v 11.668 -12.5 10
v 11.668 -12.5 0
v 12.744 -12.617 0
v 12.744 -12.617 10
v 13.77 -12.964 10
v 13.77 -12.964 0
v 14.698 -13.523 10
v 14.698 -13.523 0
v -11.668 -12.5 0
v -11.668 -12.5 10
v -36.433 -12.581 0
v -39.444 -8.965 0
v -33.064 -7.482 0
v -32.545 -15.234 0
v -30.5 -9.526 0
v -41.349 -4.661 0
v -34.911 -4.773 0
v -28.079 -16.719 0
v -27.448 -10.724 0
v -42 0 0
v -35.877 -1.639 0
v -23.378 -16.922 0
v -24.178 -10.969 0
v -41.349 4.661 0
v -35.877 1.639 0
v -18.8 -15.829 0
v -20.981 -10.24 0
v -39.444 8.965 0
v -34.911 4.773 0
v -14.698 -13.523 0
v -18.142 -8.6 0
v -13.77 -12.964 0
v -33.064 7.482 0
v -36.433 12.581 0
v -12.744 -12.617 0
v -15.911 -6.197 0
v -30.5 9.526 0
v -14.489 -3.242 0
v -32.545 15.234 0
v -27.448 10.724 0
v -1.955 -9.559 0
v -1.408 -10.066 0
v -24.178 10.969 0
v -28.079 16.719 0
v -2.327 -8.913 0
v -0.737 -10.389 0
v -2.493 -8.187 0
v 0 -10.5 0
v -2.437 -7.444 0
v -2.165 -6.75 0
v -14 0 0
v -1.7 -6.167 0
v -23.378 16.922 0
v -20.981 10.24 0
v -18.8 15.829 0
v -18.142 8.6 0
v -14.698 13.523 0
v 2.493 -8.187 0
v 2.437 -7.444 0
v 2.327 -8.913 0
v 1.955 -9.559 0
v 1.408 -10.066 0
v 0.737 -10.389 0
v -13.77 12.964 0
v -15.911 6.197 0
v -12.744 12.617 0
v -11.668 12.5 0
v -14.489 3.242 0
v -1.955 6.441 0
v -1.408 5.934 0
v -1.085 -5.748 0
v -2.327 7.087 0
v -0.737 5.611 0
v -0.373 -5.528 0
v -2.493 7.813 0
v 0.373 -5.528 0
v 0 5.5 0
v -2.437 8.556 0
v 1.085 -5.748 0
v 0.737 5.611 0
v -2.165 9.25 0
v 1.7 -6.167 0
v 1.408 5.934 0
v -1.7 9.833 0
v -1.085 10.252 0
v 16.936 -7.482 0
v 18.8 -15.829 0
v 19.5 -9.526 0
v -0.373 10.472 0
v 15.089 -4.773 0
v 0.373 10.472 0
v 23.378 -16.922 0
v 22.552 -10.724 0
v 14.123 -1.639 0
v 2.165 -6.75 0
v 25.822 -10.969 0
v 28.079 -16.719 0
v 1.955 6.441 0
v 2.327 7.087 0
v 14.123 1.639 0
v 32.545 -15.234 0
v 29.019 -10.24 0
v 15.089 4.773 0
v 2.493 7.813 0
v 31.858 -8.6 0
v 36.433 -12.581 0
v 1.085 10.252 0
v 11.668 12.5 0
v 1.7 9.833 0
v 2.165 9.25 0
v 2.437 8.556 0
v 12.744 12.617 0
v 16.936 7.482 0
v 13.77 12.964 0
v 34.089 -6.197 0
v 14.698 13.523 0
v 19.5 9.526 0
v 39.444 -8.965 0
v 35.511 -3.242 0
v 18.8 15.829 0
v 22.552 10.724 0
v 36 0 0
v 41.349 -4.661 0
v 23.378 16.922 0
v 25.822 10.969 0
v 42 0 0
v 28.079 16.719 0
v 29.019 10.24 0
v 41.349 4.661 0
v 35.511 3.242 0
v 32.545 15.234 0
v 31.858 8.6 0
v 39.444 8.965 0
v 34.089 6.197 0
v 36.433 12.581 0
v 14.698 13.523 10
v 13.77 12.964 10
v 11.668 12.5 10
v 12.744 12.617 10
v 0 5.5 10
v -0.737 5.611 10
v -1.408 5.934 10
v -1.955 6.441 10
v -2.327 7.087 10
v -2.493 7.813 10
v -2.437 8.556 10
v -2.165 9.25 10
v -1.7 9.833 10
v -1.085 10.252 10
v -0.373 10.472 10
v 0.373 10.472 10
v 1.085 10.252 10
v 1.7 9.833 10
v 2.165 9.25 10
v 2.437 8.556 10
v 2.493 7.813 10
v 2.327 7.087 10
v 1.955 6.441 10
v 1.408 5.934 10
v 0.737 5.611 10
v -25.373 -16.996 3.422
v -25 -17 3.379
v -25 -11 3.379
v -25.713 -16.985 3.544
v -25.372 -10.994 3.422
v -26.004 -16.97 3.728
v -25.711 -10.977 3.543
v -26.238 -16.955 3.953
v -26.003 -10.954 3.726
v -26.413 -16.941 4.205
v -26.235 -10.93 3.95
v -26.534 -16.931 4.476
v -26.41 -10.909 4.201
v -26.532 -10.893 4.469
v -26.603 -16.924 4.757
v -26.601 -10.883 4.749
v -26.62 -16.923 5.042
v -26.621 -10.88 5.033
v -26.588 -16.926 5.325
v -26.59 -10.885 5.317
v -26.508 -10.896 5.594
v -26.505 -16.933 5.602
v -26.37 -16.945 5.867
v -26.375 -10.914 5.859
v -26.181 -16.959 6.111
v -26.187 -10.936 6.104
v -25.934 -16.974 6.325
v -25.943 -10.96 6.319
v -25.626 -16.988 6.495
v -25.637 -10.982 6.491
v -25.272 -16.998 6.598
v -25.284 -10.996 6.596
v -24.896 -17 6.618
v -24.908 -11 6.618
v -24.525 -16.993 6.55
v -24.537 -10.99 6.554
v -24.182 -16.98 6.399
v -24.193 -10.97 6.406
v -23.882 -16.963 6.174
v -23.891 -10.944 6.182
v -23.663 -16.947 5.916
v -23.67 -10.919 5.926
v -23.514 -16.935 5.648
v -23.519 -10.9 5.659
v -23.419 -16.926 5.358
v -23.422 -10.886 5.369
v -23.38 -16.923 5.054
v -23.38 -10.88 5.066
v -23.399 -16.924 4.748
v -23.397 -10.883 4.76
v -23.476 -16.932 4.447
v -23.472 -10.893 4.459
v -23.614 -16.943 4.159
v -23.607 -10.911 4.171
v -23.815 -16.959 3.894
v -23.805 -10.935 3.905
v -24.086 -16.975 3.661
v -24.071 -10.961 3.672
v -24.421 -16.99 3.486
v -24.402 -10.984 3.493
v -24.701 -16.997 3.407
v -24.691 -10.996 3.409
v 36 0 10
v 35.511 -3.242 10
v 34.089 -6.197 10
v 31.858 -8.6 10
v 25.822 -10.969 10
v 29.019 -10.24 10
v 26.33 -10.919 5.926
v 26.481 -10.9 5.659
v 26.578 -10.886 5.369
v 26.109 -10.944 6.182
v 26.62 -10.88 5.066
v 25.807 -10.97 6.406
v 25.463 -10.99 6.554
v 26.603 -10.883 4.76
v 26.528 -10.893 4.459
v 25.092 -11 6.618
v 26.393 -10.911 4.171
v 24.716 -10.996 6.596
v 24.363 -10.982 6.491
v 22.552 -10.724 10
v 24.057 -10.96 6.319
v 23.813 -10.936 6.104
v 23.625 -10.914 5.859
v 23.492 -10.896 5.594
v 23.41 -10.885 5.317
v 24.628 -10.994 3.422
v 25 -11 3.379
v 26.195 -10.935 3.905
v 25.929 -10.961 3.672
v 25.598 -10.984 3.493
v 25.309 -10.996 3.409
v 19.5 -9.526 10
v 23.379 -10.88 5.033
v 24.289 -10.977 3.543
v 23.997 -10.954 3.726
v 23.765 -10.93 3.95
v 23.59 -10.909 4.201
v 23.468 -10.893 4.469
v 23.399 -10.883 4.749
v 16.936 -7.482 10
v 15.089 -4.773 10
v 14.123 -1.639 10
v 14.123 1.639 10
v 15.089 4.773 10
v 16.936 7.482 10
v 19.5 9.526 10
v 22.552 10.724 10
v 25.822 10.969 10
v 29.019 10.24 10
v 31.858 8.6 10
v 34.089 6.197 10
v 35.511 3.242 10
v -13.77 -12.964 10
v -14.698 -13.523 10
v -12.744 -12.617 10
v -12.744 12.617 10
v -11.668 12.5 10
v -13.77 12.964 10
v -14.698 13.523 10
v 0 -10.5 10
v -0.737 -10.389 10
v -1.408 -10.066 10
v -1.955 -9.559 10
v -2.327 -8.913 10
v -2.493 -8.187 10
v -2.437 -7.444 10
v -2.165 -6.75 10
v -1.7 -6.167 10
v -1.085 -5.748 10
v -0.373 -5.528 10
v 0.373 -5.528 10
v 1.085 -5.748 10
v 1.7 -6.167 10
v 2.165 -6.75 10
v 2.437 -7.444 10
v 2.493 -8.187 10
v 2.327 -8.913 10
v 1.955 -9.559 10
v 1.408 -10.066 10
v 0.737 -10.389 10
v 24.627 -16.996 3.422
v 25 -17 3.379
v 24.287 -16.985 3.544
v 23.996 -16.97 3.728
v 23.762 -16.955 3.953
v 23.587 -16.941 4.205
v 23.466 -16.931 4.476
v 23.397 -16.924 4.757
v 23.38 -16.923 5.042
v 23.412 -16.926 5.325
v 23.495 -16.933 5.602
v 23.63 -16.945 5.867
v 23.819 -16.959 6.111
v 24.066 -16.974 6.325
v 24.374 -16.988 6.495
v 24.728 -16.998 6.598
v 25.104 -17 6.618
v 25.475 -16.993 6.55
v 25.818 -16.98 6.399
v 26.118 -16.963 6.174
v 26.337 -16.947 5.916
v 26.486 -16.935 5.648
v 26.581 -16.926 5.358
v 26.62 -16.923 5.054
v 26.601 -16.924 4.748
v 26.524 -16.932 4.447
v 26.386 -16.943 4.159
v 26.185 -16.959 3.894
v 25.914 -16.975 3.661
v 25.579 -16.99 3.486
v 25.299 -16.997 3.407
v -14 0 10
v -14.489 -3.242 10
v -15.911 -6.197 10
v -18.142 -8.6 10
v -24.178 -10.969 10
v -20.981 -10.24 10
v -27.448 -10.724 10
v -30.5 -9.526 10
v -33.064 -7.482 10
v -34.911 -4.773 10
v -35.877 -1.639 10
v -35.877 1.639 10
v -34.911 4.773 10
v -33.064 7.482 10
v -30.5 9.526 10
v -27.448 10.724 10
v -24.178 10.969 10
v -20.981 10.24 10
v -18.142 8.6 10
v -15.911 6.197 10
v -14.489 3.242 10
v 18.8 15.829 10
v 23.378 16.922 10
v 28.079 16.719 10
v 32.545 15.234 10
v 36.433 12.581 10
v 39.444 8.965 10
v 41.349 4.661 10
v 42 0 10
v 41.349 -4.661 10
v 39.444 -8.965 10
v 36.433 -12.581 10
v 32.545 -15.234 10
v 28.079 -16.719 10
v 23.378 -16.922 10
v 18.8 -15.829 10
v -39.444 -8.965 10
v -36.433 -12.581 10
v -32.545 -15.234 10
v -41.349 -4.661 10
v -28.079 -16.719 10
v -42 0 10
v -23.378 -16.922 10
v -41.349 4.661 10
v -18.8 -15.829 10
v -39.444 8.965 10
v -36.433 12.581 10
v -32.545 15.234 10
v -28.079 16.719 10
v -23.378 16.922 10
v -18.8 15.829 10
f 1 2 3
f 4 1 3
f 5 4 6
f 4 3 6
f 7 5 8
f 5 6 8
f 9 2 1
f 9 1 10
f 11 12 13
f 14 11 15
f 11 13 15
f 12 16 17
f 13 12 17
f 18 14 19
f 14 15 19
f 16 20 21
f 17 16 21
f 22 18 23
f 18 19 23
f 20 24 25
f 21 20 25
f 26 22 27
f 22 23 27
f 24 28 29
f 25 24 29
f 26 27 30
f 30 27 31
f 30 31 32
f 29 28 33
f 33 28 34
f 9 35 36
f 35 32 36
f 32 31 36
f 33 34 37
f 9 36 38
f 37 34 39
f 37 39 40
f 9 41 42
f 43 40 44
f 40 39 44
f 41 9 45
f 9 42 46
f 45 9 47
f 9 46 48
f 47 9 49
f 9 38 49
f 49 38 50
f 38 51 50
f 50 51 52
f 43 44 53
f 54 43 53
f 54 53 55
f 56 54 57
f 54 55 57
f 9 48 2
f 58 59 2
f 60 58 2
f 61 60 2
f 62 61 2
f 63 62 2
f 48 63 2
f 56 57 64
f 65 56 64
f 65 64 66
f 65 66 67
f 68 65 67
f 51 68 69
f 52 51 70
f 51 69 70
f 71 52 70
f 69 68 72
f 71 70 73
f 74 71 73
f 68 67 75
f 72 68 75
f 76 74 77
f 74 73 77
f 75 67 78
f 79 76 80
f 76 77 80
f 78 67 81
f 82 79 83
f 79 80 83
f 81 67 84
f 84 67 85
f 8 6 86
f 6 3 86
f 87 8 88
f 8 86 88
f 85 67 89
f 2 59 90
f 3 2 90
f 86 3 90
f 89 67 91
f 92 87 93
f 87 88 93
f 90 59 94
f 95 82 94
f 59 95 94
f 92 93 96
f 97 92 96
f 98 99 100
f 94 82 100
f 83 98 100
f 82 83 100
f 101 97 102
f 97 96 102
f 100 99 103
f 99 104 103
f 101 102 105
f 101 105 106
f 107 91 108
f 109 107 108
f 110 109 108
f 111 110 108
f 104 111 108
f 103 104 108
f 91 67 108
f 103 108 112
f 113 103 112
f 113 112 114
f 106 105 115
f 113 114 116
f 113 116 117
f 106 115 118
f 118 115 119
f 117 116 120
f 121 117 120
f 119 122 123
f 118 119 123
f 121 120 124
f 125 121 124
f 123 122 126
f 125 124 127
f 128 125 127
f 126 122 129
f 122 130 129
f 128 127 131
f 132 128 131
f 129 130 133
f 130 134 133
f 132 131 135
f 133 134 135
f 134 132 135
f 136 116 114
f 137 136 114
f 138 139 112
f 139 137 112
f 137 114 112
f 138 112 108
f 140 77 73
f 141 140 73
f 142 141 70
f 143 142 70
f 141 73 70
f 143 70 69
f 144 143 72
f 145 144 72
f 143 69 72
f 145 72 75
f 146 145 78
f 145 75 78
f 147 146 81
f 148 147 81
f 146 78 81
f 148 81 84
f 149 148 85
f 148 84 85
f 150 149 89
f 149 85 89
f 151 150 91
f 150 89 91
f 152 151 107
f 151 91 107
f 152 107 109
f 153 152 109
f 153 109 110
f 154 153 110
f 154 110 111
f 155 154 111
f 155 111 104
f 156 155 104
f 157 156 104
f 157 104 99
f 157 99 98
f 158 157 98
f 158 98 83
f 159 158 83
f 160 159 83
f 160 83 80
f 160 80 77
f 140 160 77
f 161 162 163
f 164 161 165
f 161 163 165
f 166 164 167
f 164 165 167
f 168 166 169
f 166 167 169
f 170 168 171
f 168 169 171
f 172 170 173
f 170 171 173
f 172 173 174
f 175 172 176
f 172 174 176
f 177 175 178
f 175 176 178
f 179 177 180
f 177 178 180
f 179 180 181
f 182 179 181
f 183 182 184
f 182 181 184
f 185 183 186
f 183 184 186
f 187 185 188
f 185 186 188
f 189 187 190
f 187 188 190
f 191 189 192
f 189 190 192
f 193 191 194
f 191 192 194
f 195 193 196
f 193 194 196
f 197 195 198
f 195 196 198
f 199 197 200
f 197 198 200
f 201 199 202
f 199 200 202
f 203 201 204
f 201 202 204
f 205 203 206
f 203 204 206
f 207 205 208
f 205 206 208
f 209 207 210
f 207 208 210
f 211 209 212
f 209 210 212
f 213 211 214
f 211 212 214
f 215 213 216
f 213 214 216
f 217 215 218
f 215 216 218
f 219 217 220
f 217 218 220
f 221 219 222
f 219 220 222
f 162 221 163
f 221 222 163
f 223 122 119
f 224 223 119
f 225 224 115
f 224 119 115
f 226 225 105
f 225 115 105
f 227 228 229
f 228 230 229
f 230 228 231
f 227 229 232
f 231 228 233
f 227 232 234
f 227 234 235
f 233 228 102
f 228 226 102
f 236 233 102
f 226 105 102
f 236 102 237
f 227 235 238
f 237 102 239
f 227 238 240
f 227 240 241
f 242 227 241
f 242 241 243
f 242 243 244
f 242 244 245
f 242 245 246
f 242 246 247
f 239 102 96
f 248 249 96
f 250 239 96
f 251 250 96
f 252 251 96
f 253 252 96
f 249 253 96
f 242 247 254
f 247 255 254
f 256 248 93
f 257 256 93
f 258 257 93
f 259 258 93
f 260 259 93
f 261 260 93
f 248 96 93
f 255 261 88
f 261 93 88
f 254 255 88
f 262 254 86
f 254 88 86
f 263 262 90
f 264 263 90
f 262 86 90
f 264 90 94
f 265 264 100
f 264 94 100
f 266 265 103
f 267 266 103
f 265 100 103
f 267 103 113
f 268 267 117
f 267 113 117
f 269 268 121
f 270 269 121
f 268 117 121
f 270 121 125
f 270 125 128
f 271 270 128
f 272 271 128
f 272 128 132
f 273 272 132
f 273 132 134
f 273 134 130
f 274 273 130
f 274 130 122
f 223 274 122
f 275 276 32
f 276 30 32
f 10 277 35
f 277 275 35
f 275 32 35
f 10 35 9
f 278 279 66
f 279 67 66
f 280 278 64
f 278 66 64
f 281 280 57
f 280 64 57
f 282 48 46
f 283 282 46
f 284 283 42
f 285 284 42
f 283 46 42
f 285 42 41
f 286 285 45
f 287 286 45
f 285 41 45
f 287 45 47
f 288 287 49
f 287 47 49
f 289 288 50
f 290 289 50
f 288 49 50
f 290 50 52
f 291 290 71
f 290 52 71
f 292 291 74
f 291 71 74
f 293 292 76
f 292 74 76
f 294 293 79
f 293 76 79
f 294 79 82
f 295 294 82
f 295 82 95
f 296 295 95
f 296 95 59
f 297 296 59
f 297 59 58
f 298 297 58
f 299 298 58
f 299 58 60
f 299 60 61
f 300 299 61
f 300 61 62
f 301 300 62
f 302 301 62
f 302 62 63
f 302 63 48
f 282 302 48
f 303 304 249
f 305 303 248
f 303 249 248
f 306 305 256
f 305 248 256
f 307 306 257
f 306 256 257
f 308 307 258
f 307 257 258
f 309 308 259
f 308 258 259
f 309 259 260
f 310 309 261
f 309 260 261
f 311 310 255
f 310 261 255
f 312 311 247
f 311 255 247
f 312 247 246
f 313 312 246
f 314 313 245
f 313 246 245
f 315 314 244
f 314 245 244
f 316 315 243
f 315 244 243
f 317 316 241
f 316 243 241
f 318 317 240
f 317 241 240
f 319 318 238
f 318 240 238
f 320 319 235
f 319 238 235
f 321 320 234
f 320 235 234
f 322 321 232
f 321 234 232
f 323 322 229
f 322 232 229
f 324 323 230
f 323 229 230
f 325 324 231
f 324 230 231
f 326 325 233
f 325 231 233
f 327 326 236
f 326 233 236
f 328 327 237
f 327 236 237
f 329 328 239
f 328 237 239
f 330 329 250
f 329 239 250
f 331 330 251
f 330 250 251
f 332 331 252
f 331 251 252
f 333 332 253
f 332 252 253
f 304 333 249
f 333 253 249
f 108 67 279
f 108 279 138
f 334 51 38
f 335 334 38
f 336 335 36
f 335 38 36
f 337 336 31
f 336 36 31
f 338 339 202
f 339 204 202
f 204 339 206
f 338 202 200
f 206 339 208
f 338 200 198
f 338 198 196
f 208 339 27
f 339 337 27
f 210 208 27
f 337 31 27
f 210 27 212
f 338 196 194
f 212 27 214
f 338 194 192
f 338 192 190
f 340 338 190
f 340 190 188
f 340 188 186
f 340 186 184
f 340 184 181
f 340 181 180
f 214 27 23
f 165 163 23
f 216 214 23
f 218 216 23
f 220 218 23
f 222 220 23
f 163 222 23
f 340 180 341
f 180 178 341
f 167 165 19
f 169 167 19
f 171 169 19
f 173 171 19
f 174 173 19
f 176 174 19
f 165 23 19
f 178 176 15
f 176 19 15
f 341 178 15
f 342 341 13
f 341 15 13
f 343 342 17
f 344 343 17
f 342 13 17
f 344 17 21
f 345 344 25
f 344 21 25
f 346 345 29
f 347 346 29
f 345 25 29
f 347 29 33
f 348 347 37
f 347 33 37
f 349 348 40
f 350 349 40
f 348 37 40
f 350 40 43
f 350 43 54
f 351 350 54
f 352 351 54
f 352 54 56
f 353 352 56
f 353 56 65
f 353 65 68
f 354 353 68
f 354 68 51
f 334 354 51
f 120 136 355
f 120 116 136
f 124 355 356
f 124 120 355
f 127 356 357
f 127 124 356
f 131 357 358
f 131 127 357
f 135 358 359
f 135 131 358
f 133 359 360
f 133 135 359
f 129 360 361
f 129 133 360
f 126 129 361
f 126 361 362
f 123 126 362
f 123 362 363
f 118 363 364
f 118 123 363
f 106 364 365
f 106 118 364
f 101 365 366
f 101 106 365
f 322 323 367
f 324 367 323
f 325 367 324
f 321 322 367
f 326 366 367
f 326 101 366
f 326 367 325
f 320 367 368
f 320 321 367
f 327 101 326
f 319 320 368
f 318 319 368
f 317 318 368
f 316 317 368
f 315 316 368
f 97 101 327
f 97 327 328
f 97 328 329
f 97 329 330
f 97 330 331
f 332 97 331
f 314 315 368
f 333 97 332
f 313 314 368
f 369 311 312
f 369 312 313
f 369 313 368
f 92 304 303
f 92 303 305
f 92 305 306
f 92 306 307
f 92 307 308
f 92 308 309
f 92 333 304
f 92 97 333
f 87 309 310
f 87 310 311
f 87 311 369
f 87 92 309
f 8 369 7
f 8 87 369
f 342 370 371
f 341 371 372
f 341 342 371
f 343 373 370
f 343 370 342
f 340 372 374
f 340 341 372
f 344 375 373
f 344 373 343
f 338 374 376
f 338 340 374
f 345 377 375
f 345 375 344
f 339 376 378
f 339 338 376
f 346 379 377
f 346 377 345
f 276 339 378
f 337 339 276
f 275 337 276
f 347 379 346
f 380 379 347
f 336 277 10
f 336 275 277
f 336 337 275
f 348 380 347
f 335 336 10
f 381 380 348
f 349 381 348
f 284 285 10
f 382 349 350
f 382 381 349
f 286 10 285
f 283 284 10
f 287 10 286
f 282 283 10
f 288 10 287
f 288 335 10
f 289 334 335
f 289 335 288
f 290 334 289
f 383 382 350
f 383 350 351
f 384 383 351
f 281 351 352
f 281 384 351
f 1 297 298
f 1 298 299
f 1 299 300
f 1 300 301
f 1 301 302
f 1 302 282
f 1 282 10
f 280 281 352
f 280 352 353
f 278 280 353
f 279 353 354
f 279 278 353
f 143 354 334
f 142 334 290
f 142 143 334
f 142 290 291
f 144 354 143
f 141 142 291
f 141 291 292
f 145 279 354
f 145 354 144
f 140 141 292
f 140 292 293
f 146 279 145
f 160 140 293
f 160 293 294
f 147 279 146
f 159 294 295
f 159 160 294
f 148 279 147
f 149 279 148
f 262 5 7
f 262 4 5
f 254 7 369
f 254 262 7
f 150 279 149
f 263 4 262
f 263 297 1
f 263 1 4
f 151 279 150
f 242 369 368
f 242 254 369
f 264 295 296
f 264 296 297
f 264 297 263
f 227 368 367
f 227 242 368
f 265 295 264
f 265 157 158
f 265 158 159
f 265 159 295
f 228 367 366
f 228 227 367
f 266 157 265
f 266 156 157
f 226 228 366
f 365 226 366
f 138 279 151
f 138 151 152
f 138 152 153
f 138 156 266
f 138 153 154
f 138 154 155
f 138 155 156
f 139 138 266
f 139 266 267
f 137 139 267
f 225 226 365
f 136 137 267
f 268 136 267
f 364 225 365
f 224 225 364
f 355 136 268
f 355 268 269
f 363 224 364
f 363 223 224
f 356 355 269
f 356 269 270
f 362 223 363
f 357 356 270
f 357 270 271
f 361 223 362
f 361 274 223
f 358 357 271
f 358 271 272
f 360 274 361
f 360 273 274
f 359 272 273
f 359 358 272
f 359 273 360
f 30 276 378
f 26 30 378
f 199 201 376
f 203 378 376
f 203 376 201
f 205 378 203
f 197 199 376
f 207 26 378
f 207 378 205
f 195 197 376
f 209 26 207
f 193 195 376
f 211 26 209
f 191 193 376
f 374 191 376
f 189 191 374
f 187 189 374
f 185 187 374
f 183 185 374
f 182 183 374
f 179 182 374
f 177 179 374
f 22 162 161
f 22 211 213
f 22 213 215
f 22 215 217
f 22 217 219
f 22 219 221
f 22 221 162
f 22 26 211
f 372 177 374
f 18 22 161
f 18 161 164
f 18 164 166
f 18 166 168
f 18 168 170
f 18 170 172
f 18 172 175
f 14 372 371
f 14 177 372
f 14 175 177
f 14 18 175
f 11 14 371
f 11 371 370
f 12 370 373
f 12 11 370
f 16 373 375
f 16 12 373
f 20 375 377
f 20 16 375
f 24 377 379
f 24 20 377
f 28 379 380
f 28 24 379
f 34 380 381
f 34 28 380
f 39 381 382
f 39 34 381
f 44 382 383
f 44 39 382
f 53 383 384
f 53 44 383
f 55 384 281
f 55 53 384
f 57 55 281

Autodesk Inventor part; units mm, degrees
ref_plane "YZ Plane" through (0, 0, 0) normal (1, 0, 0) x (0, 1, 0)
ref_plane "XY Plane" through (0, 0, 0) normal (0, 0, 1) x (1, 0, 0)
sketch "Skizze1" plane through (0, 0, 0) normal (0, 0, 1) x (1, 0, 0)
  line L0 (-58.8, 0) -> (58.8, 0) projected
  line L1 (0, -24.5) -> (0, 24.5) projected
  circle A0 centre (-25, 0) radius 11
  circle A1 centre (25, 0) radius 11
  arc A2 (-14.6978, 13.5227) -> (-14.6978, -13.5227) centre (-25, 0) ccw
  arc A3 (14.6978, -13.5227) -> (14.6978, 13.5227) centre (25, 0) ccw
  line L2 (11.6677, -12.5) -> (-11.6677, -12.5)
  line L3 (-11.6677, 12.5) -> (11.6677, 12.5)
  arc A4 (-11.6677, -12.5) -> (-14.6978, -13.5227) centre (-11.6677, -17.5) ccw
  arc A5 (14.6978, -13.5227) -> (11.6677, -12.5) centre (11.6677, -17.5) ccw
  arc A6 (11.6677, 12.5) -> (14.6978, 13.5227) centre (11.6677, 17.5) ccw
  arc A7 (-14.6978, 13.5227) -> (-11.6677, 12.5) centre (-11.6677, 17.5) ccw
  point P0 (0, 0)
  point P1 (-13.4783, -12.5)
  point P2 (13.4783, 12.5)
  point P3 (13.4783, -12.5)
  point P4 (-13.4783, 12.5)
  dimension "d0" = 50
  dimension "d1" = 22
  dimension "d2" = 34
  dimension "d4" = 25
  dimension "d5" = 5
  dimension "d6" = 6
extrude "Extrusion1" add sketch "Skizze1" along normal blind 10 contours A2 A7 L3 L1 L0 A0 | L0 A0 L1 L2 A4 A2 | L1 L3 A6 A3 L0 A1 | L0 A1 A3 A5 L2 L1
ref_plane "Arbeitsebene1" through (25, -17, 0) normal (0, 1, 0) x (-1, 0, 0)
sketch "Skizze2" plane through (25, -17, 0) normal (0, 1, 0) x (-1, 0, 0)
  line L0 (-33.8, 0) -> (83.8, 0) projected
  line L1 (25, -2) -> (25, 12) projected
  line L2 (39.6978, 10) -> (67, 10) projected
  line L3 (-17, 10) -> (10.3022, 10) projected
  line L4 (-17, 0) -> (-17, 10) projected
  line L5 (67, 0) -> (67, 10) projected
  line L6 (67, 5) -> (-17, 5)
  point P0 (25, 0)
  point P1 (50, 5)
  point P2 (0, 5)
  dimension "d9" = 50
hole "Bohrung1" at (-25, -17, 5) at (25, -17, 5) direction (0, 1, 0) diameter 3.242 depth 8 tip angle 118 thread size "M4x0.7" class "6H" standard "ISO Metric profile"
sketch "Skizze3" plane through (0, 0, 10) normal (0, 0, 1) x (1, 0, 0)
  circle A0 centre (0, -8) radius 1.5 projected
  circle A1 centre (0, 8) radius 1.5 projected
  point P0 (0, 0)
hole "Bohrung2" at (0, 8, 10) at (0, -8, 10) direction (0, 0, -1) diameter 5 end through all
properties part number "13_0204_047"
